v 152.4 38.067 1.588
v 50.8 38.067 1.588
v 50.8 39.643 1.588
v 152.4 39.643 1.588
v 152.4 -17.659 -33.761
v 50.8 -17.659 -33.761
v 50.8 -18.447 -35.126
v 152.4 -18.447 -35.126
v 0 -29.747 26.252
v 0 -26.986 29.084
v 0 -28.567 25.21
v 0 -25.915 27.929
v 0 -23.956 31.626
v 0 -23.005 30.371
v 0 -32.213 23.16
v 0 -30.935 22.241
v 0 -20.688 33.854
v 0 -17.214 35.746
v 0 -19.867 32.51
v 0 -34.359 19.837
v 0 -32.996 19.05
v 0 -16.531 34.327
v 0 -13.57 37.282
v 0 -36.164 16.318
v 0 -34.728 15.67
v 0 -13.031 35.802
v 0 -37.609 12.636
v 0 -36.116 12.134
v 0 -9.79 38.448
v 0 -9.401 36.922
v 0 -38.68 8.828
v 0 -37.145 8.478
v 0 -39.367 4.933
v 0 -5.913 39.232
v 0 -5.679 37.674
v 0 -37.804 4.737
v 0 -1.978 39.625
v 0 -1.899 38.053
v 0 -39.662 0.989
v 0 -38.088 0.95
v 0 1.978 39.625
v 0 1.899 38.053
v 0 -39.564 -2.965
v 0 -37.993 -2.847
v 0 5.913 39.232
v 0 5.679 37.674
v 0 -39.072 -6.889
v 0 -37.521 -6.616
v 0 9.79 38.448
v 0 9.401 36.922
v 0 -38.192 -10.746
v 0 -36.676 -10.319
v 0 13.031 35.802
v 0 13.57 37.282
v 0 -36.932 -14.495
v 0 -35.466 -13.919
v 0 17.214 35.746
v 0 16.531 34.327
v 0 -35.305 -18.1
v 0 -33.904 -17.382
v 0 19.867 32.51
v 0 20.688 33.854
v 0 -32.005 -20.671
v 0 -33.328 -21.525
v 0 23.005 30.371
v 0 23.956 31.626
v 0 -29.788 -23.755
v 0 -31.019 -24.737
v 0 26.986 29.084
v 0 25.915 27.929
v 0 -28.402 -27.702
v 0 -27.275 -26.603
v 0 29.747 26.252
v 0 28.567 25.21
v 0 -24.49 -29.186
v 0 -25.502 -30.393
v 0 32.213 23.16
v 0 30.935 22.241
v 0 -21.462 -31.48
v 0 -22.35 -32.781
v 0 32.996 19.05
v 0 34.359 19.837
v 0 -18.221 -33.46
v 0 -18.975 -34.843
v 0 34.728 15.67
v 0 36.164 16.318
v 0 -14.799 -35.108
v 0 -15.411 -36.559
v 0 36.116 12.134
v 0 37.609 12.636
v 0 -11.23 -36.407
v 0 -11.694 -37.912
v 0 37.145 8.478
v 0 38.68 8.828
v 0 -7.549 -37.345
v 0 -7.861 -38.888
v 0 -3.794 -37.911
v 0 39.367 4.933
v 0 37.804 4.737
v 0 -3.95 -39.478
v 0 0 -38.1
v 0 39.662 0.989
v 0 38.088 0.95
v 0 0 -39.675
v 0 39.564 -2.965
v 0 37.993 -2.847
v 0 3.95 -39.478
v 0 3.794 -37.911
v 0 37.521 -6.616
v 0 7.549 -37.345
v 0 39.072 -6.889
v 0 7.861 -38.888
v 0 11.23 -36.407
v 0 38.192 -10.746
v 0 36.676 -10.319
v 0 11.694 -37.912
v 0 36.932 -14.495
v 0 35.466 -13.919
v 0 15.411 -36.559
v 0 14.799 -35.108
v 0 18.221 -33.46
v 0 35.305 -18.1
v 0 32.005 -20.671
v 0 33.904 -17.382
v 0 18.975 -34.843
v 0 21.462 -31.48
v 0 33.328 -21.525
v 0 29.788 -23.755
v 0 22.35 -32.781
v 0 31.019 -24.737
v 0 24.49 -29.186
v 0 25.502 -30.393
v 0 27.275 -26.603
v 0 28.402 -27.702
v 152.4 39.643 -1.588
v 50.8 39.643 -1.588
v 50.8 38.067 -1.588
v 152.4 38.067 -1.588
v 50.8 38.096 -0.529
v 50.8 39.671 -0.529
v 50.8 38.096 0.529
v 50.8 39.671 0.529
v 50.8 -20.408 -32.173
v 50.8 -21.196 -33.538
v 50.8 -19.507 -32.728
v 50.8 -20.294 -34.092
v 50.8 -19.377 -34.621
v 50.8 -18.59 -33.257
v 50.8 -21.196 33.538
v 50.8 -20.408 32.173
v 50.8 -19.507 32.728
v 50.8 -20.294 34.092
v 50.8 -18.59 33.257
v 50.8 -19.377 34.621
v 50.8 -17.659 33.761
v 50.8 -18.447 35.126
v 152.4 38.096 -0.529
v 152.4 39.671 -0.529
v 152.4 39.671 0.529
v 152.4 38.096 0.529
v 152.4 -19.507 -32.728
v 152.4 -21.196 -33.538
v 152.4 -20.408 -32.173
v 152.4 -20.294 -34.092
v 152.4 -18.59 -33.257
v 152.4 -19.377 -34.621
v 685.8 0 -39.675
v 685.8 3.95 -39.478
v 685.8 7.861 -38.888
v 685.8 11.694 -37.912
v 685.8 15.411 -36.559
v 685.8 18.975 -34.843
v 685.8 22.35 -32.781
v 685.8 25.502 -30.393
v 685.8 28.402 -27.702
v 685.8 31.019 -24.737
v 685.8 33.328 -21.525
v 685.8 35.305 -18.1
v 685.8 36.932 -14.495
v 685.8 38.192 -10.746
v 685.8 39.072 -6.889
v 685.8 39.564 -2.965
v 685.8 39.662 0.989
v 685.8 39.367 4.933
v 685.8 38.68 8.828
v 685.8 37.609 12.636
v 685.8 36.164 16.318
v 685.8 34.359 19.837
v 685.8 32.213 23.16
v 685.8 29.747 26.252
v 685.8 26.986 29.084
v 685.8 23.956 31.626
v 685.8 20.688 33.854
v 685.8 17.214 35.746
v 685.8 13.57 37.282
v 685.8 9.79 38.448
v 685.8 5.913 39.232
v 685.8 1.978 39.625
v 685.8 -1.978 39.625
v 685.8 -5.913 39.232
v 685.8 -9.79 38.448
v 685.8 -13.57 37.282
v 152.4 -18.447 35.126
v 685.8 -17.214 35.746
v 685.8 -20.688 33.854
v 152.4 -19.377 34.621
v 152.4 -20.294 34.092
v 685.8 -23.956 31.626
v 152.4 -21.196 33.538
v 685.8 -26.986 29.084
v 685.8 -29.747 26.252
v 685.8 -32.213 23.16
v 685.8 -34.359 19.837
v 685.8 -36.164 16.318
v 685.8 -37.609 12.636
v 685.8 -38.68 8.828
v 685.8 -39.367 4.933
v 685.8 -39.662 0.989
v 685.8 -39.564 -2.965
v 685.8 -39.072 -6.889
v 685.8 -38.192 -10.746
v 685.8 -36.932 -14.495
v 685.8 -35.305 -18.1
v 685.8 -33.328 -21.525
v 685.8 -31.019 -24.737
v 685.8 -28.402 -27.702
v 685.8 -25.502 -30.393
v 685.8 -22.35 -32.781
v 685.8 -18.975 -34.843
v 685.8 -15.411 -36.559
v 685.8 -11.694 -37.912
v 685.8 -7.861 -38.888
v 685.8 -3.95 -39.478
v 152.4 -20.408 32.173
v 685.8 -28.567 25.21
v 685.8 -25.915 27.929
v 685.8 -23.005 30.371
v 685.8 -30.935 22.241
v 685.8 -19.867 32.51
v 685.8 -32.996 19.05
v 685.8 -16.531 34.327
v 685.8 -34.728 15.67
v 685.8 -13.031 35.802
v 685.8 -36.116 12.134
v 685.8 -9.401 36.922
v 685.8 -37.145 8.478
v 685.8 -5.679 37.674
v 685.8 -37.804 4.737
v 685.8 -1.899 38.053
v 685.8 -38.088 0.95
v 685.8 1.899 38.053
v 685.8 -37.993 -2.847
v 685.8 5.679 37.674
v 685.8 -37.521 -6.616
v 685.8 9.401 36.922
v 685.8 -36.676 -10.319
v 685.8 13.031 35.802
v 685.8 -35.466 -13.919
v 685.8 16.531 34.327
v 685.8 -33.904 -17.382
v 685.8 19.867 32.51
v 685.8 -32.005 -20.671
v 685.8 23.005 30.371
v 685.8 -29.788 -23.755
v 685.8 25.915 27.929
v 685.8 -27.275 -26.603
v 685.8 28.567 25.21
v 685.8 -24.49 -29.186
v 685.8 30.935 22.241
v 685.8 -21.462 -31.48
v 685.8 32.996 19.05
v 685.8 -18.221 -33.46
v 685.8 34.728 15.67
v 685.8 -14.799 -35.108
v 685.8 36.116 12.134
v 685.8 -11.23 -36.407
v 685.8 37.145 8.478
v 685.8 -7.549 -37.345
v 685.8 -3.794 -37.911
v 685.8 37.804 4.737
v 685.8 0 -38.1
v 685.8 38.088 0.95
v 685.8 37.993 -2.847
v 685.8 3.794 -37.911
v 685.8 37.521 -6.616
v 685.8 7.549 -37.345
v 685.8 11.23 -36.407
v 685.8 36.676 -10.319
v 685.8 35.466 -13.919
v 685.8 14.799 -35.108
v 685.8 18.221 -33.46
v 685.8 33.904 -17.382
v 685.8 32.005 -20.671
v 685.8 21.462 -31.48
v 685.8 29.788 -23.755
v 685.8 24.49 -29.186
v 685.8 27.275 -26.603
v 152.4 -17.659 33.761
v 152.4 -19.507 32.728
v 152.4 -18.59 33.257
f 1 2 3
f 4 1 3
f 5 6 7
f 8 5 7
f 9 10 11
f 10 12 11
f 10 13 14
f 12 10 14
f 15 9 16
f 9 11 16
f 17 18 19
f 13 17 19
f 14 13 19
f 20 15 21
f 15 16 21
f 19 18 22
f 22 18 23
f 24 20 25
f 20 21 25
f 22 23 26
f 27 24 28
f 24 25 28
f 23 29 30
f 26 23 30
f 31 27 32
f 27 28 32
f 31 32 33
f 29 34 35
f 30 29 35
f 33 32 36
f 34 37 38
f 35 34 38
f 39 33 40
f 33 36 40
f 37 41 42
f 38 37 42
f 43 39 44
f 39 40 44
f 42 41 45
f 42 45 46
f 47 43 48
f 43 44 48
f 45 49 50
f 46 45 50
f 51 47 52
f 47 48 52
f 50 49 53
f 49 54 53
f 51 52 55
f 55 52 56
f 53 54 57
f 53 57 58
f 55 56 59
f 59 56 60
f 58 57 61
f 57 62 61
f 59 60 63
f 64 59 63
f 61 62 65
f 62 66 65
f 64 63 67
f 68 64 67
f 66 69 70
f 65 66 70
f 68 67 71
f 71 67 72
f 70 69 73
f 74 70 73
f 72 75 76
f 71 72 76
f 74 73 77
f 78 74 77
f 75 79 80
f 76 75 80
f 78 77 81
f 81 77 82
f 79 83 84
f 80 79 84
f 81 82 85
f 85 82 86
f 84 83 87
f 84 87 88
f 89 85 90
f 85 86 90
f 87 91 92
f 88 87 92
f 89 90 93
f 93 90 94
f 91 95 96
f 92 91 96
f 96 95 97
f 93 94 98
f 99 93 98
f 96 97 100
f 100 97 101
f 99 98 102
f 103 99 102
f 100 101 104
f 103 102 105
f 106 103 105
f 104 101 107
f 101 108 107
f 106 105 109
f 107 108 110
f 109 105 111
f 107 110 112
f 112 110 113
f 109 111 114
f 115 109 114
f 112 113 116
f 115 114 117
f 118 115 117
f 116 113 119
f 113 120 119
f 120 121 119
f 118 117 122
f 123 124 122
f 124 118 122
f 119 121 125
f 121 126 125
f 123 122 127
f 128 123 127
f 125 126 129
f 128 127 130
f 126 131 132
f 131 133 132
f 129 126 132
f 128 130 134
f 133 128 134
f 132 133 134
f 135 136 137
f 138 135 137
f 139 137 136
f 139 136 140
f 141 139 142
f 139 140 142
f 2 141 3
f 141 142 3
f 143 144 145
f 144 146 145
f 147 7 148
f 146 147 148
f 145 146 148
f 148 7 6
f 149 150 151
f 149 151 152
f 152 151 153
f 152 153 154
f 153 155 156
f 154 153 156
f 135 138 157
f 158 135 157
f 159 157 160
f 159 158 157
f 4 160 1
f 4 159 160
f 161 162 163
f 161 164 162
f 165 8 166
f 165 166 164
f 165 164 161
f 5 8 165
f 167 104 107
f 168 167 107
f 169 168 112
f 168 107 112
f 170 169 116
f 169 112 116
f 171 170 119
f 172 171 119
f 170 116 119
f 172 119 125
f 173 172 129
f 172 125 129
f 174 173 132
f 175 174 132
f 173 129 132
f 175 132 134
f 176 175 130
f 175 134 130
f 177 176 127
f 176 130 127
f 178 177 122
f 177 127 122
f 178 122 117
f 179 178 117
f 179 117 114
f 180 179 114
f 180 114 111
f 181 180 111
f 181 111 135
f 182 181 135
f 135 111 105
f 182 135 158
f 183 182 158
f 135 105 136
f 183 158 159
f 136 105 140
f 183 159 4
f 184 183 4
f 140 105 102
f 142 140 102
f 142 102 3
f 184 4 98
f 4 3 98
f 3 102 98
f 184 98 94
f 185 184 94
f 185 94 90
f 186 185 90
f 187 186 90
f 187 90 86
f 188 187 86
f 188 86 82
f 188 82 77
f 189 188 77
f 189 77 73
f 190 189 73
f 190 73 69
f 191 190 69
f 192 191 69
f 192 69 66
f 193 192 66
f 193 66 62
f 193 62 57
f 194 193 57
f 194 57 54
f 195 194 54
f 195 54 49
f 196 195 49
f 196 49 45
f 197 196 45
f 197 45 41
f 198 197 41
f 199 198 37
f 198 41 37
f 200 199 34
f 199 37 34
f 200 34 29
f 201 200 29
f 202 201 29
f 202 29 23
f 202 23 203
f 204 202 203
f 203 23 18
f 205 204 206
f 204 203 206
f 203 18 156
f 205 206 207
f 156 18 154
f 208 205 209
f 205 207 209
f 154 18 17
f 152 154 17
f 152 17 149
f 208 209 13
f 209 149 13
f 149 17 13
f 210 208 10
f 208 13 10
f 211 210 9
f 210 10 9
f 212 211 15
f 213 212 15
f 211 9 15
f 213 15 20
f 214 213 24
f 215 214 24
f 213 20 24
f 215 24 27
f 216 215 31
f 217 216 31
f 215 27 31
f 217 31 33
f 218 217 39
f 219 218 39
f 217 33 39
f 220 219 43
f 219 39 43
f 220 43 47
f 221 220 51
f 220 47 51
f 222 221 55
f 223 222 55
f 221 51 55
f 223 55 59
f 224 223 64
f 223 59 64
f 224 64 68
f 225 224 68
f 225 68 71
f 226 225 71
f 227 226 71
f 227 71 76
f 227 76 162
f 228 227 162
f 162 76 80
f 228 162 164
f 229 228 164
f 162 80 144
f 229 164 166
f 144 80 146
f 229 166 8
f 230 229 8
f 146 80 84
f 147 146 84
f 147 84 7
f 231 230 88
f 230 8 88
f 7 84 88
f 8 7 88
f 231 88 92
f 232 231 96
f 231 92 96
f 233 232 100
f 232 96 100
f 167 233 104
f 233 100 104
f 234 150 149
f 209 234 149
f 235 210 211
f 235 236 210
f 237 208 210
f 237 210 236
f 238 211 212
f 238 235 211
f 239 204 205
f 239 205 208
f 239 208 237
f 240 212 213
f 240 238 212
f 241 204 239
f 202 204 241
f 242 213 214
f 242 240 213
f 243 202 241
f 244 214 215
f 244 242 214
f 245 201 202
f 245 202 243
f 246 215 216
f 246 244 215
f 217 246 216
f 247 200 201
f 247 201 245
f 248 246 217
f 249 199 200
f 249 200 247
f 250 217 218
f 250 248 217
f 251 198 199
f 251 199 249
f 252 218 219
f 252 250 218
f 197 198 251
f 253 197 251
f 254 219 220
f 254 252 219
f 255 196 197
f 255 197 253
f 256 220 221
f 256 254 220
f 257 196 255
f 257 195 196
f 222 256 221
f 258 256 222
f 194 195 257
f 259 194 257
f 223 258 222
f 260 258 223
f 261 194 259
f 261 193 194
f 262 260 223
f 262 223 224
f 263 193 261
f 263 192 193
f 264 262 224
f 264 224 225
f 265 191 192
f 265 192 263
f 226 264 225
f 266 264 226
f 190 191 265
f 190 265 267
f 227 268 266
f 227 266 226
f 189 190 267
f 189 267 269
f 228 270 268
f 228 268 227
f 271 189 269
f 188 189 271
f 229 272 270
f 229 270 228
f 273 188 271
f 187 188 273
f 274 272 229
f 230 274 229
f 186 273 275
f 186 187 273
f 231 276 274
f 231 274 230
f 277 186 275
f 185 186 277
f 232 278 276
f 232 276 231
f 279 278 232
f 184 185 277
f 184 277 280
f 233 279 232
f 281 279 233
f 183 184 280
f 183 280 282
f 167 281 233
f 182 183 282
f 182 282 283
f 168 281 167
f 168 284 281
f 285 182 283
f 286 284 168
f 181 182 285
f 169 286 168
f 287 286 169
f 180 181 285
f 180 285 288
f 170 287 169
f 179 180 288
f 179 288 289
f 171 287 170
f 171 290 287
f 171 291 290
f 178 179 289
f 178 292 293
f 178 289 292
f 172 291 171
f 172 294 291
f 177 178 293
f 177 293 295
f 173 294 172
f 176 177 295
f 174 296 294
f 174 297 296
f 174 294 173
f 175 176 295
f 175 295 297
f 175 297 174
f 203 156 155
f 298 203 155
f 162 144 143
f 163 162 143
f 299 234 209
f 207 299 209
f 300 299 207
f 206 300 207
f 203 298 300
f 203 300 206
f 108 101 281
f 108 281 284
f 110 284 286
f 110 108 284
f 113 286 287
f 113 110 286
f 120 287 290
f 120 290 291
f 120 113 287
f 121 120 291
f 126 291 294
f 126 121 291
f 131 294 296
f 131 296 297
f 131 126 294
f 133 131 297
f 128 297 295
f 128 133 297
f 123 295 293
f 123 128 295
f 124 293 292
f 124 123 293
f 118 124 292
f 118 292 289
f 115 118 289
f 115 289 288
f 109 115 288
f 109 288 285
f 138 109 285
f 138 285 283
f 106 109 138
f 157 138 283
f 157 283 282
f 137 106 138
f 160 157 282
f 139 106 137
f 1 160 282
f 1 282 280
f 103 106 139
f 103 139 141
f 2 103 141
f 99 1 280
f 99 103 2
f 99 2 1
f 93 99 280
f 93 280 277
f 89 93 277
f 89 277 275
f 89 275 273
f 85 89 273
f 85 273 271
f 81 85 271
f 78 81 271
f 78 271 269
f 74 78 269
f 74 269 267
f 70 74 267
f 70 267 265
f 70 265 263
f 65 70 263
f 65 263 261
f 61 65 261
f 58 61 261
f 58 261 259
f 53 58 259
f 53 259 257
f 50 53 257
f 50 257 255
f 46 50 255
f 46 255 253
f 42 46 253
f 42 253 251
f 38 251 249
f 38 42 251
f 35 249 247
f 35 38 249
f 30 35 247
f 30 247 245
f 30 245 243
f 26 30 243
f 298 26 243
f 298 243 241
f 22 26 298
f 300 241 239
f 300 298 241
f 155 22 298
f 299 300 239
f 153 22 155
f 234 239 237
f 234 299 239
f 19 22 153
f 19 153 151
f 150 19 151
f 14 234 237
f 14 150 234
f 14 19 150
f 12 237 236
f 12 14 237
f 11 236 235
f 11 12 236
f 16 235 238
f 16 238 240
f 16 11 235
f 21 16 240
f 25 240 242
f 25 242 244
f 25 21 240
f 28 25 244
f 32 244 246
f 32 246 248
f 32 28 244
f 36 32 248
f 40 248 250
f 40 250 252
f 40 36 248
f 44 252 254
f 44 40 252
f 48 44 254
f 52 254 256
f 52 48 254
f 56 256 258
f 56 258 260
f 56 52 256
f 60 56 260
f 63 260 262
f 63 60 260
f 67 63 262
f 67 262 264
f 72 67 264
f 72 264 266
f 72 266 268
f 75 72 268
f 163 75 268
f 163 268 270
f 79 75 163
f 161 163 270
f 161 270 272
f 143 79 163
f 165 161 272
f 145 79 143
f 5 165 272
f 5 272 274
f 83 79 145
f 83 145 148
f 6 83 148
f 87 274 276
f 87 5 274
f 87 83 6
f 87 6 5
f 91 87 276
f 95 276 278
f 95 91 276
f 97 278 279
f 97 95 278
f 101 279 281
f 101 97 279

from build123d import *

# Parameters (mm, degrees)
SKETCH1_R           = 39.6748
SKETCH1_R_2         = 38.1
BOSS_EXTRUDE1_DEPTH = 685.8
CUT_EXTRUDE2_DEPTH  = 101.6


with BuildPart() as part:
    # Sketch1 → Boss-Extrude1 (new body)
    with BuildSketch(Plane(origin=(0, 0, 0), x_dir=(0, 0, -1), z_dir=(1, 0, 0))):
        Circle(SKETCH1_R)
        Circle(SKETCH1_R_2, mode=Mode.SUBTRACT)
    extrude(amount=BOSS_EXTRUDE1_DEPTH)

    # Sketch2 → Cut-Extrude2 (cut)
    with BuildSketch(Plane.ZY.offset(-50.8)):
        with BuildLine():
            Line((-1.5875, 39.643027114), (-1.5875, 38.066912716))
            ThreePointArc((-1.5875, 38.066912716), (0, 38.1), (1.5875, 38.066912716))
            Line((1.5875, 38.066912716), (1.5875, 39.643027114))
            ThreePointArc((1.5875, 39.643027114), (0, 39.6748), (-1.5875, 39.643027114))
        make_face()
        with BuildLine():
            Line((35.125618564, -18.446698229), (33.760663456, -17.65864103))
            ThreePointArc((33.760663456, -17.65864103), (32.995567884, -19.05), (32.173163456, -20.408271687))
            Line((32.173163456, -20.408271687), (33.538118564, -21.196328886))
            ThreePointArc((33.538118564, -21.196328886), (34.35938469, -19.8374), (35.125618564, -18.446698229))
        make_face()
        with BuildLine():
            Line((-33.538118564, -21.196328886), (-32.173163456, -20.408271687))
            ThreePointArc((-32.173163456, -20.408271687), (-32.995567884, -19.05), (-33.760663456, -17.65864103))
            Line((-33.760663456, -17.65864103), (-35.125618564, -18.446698229))
            ThreePointArc((-35.125618564, -18.446698229), (-34.35938469, -19.8374), (-33.538118564, -21.196328886))
        make_face()
    extrude(amount=-CUT_EXTRUDE2_DEPTH, mode=Mode.SUBTRACT)


solid = part.part
